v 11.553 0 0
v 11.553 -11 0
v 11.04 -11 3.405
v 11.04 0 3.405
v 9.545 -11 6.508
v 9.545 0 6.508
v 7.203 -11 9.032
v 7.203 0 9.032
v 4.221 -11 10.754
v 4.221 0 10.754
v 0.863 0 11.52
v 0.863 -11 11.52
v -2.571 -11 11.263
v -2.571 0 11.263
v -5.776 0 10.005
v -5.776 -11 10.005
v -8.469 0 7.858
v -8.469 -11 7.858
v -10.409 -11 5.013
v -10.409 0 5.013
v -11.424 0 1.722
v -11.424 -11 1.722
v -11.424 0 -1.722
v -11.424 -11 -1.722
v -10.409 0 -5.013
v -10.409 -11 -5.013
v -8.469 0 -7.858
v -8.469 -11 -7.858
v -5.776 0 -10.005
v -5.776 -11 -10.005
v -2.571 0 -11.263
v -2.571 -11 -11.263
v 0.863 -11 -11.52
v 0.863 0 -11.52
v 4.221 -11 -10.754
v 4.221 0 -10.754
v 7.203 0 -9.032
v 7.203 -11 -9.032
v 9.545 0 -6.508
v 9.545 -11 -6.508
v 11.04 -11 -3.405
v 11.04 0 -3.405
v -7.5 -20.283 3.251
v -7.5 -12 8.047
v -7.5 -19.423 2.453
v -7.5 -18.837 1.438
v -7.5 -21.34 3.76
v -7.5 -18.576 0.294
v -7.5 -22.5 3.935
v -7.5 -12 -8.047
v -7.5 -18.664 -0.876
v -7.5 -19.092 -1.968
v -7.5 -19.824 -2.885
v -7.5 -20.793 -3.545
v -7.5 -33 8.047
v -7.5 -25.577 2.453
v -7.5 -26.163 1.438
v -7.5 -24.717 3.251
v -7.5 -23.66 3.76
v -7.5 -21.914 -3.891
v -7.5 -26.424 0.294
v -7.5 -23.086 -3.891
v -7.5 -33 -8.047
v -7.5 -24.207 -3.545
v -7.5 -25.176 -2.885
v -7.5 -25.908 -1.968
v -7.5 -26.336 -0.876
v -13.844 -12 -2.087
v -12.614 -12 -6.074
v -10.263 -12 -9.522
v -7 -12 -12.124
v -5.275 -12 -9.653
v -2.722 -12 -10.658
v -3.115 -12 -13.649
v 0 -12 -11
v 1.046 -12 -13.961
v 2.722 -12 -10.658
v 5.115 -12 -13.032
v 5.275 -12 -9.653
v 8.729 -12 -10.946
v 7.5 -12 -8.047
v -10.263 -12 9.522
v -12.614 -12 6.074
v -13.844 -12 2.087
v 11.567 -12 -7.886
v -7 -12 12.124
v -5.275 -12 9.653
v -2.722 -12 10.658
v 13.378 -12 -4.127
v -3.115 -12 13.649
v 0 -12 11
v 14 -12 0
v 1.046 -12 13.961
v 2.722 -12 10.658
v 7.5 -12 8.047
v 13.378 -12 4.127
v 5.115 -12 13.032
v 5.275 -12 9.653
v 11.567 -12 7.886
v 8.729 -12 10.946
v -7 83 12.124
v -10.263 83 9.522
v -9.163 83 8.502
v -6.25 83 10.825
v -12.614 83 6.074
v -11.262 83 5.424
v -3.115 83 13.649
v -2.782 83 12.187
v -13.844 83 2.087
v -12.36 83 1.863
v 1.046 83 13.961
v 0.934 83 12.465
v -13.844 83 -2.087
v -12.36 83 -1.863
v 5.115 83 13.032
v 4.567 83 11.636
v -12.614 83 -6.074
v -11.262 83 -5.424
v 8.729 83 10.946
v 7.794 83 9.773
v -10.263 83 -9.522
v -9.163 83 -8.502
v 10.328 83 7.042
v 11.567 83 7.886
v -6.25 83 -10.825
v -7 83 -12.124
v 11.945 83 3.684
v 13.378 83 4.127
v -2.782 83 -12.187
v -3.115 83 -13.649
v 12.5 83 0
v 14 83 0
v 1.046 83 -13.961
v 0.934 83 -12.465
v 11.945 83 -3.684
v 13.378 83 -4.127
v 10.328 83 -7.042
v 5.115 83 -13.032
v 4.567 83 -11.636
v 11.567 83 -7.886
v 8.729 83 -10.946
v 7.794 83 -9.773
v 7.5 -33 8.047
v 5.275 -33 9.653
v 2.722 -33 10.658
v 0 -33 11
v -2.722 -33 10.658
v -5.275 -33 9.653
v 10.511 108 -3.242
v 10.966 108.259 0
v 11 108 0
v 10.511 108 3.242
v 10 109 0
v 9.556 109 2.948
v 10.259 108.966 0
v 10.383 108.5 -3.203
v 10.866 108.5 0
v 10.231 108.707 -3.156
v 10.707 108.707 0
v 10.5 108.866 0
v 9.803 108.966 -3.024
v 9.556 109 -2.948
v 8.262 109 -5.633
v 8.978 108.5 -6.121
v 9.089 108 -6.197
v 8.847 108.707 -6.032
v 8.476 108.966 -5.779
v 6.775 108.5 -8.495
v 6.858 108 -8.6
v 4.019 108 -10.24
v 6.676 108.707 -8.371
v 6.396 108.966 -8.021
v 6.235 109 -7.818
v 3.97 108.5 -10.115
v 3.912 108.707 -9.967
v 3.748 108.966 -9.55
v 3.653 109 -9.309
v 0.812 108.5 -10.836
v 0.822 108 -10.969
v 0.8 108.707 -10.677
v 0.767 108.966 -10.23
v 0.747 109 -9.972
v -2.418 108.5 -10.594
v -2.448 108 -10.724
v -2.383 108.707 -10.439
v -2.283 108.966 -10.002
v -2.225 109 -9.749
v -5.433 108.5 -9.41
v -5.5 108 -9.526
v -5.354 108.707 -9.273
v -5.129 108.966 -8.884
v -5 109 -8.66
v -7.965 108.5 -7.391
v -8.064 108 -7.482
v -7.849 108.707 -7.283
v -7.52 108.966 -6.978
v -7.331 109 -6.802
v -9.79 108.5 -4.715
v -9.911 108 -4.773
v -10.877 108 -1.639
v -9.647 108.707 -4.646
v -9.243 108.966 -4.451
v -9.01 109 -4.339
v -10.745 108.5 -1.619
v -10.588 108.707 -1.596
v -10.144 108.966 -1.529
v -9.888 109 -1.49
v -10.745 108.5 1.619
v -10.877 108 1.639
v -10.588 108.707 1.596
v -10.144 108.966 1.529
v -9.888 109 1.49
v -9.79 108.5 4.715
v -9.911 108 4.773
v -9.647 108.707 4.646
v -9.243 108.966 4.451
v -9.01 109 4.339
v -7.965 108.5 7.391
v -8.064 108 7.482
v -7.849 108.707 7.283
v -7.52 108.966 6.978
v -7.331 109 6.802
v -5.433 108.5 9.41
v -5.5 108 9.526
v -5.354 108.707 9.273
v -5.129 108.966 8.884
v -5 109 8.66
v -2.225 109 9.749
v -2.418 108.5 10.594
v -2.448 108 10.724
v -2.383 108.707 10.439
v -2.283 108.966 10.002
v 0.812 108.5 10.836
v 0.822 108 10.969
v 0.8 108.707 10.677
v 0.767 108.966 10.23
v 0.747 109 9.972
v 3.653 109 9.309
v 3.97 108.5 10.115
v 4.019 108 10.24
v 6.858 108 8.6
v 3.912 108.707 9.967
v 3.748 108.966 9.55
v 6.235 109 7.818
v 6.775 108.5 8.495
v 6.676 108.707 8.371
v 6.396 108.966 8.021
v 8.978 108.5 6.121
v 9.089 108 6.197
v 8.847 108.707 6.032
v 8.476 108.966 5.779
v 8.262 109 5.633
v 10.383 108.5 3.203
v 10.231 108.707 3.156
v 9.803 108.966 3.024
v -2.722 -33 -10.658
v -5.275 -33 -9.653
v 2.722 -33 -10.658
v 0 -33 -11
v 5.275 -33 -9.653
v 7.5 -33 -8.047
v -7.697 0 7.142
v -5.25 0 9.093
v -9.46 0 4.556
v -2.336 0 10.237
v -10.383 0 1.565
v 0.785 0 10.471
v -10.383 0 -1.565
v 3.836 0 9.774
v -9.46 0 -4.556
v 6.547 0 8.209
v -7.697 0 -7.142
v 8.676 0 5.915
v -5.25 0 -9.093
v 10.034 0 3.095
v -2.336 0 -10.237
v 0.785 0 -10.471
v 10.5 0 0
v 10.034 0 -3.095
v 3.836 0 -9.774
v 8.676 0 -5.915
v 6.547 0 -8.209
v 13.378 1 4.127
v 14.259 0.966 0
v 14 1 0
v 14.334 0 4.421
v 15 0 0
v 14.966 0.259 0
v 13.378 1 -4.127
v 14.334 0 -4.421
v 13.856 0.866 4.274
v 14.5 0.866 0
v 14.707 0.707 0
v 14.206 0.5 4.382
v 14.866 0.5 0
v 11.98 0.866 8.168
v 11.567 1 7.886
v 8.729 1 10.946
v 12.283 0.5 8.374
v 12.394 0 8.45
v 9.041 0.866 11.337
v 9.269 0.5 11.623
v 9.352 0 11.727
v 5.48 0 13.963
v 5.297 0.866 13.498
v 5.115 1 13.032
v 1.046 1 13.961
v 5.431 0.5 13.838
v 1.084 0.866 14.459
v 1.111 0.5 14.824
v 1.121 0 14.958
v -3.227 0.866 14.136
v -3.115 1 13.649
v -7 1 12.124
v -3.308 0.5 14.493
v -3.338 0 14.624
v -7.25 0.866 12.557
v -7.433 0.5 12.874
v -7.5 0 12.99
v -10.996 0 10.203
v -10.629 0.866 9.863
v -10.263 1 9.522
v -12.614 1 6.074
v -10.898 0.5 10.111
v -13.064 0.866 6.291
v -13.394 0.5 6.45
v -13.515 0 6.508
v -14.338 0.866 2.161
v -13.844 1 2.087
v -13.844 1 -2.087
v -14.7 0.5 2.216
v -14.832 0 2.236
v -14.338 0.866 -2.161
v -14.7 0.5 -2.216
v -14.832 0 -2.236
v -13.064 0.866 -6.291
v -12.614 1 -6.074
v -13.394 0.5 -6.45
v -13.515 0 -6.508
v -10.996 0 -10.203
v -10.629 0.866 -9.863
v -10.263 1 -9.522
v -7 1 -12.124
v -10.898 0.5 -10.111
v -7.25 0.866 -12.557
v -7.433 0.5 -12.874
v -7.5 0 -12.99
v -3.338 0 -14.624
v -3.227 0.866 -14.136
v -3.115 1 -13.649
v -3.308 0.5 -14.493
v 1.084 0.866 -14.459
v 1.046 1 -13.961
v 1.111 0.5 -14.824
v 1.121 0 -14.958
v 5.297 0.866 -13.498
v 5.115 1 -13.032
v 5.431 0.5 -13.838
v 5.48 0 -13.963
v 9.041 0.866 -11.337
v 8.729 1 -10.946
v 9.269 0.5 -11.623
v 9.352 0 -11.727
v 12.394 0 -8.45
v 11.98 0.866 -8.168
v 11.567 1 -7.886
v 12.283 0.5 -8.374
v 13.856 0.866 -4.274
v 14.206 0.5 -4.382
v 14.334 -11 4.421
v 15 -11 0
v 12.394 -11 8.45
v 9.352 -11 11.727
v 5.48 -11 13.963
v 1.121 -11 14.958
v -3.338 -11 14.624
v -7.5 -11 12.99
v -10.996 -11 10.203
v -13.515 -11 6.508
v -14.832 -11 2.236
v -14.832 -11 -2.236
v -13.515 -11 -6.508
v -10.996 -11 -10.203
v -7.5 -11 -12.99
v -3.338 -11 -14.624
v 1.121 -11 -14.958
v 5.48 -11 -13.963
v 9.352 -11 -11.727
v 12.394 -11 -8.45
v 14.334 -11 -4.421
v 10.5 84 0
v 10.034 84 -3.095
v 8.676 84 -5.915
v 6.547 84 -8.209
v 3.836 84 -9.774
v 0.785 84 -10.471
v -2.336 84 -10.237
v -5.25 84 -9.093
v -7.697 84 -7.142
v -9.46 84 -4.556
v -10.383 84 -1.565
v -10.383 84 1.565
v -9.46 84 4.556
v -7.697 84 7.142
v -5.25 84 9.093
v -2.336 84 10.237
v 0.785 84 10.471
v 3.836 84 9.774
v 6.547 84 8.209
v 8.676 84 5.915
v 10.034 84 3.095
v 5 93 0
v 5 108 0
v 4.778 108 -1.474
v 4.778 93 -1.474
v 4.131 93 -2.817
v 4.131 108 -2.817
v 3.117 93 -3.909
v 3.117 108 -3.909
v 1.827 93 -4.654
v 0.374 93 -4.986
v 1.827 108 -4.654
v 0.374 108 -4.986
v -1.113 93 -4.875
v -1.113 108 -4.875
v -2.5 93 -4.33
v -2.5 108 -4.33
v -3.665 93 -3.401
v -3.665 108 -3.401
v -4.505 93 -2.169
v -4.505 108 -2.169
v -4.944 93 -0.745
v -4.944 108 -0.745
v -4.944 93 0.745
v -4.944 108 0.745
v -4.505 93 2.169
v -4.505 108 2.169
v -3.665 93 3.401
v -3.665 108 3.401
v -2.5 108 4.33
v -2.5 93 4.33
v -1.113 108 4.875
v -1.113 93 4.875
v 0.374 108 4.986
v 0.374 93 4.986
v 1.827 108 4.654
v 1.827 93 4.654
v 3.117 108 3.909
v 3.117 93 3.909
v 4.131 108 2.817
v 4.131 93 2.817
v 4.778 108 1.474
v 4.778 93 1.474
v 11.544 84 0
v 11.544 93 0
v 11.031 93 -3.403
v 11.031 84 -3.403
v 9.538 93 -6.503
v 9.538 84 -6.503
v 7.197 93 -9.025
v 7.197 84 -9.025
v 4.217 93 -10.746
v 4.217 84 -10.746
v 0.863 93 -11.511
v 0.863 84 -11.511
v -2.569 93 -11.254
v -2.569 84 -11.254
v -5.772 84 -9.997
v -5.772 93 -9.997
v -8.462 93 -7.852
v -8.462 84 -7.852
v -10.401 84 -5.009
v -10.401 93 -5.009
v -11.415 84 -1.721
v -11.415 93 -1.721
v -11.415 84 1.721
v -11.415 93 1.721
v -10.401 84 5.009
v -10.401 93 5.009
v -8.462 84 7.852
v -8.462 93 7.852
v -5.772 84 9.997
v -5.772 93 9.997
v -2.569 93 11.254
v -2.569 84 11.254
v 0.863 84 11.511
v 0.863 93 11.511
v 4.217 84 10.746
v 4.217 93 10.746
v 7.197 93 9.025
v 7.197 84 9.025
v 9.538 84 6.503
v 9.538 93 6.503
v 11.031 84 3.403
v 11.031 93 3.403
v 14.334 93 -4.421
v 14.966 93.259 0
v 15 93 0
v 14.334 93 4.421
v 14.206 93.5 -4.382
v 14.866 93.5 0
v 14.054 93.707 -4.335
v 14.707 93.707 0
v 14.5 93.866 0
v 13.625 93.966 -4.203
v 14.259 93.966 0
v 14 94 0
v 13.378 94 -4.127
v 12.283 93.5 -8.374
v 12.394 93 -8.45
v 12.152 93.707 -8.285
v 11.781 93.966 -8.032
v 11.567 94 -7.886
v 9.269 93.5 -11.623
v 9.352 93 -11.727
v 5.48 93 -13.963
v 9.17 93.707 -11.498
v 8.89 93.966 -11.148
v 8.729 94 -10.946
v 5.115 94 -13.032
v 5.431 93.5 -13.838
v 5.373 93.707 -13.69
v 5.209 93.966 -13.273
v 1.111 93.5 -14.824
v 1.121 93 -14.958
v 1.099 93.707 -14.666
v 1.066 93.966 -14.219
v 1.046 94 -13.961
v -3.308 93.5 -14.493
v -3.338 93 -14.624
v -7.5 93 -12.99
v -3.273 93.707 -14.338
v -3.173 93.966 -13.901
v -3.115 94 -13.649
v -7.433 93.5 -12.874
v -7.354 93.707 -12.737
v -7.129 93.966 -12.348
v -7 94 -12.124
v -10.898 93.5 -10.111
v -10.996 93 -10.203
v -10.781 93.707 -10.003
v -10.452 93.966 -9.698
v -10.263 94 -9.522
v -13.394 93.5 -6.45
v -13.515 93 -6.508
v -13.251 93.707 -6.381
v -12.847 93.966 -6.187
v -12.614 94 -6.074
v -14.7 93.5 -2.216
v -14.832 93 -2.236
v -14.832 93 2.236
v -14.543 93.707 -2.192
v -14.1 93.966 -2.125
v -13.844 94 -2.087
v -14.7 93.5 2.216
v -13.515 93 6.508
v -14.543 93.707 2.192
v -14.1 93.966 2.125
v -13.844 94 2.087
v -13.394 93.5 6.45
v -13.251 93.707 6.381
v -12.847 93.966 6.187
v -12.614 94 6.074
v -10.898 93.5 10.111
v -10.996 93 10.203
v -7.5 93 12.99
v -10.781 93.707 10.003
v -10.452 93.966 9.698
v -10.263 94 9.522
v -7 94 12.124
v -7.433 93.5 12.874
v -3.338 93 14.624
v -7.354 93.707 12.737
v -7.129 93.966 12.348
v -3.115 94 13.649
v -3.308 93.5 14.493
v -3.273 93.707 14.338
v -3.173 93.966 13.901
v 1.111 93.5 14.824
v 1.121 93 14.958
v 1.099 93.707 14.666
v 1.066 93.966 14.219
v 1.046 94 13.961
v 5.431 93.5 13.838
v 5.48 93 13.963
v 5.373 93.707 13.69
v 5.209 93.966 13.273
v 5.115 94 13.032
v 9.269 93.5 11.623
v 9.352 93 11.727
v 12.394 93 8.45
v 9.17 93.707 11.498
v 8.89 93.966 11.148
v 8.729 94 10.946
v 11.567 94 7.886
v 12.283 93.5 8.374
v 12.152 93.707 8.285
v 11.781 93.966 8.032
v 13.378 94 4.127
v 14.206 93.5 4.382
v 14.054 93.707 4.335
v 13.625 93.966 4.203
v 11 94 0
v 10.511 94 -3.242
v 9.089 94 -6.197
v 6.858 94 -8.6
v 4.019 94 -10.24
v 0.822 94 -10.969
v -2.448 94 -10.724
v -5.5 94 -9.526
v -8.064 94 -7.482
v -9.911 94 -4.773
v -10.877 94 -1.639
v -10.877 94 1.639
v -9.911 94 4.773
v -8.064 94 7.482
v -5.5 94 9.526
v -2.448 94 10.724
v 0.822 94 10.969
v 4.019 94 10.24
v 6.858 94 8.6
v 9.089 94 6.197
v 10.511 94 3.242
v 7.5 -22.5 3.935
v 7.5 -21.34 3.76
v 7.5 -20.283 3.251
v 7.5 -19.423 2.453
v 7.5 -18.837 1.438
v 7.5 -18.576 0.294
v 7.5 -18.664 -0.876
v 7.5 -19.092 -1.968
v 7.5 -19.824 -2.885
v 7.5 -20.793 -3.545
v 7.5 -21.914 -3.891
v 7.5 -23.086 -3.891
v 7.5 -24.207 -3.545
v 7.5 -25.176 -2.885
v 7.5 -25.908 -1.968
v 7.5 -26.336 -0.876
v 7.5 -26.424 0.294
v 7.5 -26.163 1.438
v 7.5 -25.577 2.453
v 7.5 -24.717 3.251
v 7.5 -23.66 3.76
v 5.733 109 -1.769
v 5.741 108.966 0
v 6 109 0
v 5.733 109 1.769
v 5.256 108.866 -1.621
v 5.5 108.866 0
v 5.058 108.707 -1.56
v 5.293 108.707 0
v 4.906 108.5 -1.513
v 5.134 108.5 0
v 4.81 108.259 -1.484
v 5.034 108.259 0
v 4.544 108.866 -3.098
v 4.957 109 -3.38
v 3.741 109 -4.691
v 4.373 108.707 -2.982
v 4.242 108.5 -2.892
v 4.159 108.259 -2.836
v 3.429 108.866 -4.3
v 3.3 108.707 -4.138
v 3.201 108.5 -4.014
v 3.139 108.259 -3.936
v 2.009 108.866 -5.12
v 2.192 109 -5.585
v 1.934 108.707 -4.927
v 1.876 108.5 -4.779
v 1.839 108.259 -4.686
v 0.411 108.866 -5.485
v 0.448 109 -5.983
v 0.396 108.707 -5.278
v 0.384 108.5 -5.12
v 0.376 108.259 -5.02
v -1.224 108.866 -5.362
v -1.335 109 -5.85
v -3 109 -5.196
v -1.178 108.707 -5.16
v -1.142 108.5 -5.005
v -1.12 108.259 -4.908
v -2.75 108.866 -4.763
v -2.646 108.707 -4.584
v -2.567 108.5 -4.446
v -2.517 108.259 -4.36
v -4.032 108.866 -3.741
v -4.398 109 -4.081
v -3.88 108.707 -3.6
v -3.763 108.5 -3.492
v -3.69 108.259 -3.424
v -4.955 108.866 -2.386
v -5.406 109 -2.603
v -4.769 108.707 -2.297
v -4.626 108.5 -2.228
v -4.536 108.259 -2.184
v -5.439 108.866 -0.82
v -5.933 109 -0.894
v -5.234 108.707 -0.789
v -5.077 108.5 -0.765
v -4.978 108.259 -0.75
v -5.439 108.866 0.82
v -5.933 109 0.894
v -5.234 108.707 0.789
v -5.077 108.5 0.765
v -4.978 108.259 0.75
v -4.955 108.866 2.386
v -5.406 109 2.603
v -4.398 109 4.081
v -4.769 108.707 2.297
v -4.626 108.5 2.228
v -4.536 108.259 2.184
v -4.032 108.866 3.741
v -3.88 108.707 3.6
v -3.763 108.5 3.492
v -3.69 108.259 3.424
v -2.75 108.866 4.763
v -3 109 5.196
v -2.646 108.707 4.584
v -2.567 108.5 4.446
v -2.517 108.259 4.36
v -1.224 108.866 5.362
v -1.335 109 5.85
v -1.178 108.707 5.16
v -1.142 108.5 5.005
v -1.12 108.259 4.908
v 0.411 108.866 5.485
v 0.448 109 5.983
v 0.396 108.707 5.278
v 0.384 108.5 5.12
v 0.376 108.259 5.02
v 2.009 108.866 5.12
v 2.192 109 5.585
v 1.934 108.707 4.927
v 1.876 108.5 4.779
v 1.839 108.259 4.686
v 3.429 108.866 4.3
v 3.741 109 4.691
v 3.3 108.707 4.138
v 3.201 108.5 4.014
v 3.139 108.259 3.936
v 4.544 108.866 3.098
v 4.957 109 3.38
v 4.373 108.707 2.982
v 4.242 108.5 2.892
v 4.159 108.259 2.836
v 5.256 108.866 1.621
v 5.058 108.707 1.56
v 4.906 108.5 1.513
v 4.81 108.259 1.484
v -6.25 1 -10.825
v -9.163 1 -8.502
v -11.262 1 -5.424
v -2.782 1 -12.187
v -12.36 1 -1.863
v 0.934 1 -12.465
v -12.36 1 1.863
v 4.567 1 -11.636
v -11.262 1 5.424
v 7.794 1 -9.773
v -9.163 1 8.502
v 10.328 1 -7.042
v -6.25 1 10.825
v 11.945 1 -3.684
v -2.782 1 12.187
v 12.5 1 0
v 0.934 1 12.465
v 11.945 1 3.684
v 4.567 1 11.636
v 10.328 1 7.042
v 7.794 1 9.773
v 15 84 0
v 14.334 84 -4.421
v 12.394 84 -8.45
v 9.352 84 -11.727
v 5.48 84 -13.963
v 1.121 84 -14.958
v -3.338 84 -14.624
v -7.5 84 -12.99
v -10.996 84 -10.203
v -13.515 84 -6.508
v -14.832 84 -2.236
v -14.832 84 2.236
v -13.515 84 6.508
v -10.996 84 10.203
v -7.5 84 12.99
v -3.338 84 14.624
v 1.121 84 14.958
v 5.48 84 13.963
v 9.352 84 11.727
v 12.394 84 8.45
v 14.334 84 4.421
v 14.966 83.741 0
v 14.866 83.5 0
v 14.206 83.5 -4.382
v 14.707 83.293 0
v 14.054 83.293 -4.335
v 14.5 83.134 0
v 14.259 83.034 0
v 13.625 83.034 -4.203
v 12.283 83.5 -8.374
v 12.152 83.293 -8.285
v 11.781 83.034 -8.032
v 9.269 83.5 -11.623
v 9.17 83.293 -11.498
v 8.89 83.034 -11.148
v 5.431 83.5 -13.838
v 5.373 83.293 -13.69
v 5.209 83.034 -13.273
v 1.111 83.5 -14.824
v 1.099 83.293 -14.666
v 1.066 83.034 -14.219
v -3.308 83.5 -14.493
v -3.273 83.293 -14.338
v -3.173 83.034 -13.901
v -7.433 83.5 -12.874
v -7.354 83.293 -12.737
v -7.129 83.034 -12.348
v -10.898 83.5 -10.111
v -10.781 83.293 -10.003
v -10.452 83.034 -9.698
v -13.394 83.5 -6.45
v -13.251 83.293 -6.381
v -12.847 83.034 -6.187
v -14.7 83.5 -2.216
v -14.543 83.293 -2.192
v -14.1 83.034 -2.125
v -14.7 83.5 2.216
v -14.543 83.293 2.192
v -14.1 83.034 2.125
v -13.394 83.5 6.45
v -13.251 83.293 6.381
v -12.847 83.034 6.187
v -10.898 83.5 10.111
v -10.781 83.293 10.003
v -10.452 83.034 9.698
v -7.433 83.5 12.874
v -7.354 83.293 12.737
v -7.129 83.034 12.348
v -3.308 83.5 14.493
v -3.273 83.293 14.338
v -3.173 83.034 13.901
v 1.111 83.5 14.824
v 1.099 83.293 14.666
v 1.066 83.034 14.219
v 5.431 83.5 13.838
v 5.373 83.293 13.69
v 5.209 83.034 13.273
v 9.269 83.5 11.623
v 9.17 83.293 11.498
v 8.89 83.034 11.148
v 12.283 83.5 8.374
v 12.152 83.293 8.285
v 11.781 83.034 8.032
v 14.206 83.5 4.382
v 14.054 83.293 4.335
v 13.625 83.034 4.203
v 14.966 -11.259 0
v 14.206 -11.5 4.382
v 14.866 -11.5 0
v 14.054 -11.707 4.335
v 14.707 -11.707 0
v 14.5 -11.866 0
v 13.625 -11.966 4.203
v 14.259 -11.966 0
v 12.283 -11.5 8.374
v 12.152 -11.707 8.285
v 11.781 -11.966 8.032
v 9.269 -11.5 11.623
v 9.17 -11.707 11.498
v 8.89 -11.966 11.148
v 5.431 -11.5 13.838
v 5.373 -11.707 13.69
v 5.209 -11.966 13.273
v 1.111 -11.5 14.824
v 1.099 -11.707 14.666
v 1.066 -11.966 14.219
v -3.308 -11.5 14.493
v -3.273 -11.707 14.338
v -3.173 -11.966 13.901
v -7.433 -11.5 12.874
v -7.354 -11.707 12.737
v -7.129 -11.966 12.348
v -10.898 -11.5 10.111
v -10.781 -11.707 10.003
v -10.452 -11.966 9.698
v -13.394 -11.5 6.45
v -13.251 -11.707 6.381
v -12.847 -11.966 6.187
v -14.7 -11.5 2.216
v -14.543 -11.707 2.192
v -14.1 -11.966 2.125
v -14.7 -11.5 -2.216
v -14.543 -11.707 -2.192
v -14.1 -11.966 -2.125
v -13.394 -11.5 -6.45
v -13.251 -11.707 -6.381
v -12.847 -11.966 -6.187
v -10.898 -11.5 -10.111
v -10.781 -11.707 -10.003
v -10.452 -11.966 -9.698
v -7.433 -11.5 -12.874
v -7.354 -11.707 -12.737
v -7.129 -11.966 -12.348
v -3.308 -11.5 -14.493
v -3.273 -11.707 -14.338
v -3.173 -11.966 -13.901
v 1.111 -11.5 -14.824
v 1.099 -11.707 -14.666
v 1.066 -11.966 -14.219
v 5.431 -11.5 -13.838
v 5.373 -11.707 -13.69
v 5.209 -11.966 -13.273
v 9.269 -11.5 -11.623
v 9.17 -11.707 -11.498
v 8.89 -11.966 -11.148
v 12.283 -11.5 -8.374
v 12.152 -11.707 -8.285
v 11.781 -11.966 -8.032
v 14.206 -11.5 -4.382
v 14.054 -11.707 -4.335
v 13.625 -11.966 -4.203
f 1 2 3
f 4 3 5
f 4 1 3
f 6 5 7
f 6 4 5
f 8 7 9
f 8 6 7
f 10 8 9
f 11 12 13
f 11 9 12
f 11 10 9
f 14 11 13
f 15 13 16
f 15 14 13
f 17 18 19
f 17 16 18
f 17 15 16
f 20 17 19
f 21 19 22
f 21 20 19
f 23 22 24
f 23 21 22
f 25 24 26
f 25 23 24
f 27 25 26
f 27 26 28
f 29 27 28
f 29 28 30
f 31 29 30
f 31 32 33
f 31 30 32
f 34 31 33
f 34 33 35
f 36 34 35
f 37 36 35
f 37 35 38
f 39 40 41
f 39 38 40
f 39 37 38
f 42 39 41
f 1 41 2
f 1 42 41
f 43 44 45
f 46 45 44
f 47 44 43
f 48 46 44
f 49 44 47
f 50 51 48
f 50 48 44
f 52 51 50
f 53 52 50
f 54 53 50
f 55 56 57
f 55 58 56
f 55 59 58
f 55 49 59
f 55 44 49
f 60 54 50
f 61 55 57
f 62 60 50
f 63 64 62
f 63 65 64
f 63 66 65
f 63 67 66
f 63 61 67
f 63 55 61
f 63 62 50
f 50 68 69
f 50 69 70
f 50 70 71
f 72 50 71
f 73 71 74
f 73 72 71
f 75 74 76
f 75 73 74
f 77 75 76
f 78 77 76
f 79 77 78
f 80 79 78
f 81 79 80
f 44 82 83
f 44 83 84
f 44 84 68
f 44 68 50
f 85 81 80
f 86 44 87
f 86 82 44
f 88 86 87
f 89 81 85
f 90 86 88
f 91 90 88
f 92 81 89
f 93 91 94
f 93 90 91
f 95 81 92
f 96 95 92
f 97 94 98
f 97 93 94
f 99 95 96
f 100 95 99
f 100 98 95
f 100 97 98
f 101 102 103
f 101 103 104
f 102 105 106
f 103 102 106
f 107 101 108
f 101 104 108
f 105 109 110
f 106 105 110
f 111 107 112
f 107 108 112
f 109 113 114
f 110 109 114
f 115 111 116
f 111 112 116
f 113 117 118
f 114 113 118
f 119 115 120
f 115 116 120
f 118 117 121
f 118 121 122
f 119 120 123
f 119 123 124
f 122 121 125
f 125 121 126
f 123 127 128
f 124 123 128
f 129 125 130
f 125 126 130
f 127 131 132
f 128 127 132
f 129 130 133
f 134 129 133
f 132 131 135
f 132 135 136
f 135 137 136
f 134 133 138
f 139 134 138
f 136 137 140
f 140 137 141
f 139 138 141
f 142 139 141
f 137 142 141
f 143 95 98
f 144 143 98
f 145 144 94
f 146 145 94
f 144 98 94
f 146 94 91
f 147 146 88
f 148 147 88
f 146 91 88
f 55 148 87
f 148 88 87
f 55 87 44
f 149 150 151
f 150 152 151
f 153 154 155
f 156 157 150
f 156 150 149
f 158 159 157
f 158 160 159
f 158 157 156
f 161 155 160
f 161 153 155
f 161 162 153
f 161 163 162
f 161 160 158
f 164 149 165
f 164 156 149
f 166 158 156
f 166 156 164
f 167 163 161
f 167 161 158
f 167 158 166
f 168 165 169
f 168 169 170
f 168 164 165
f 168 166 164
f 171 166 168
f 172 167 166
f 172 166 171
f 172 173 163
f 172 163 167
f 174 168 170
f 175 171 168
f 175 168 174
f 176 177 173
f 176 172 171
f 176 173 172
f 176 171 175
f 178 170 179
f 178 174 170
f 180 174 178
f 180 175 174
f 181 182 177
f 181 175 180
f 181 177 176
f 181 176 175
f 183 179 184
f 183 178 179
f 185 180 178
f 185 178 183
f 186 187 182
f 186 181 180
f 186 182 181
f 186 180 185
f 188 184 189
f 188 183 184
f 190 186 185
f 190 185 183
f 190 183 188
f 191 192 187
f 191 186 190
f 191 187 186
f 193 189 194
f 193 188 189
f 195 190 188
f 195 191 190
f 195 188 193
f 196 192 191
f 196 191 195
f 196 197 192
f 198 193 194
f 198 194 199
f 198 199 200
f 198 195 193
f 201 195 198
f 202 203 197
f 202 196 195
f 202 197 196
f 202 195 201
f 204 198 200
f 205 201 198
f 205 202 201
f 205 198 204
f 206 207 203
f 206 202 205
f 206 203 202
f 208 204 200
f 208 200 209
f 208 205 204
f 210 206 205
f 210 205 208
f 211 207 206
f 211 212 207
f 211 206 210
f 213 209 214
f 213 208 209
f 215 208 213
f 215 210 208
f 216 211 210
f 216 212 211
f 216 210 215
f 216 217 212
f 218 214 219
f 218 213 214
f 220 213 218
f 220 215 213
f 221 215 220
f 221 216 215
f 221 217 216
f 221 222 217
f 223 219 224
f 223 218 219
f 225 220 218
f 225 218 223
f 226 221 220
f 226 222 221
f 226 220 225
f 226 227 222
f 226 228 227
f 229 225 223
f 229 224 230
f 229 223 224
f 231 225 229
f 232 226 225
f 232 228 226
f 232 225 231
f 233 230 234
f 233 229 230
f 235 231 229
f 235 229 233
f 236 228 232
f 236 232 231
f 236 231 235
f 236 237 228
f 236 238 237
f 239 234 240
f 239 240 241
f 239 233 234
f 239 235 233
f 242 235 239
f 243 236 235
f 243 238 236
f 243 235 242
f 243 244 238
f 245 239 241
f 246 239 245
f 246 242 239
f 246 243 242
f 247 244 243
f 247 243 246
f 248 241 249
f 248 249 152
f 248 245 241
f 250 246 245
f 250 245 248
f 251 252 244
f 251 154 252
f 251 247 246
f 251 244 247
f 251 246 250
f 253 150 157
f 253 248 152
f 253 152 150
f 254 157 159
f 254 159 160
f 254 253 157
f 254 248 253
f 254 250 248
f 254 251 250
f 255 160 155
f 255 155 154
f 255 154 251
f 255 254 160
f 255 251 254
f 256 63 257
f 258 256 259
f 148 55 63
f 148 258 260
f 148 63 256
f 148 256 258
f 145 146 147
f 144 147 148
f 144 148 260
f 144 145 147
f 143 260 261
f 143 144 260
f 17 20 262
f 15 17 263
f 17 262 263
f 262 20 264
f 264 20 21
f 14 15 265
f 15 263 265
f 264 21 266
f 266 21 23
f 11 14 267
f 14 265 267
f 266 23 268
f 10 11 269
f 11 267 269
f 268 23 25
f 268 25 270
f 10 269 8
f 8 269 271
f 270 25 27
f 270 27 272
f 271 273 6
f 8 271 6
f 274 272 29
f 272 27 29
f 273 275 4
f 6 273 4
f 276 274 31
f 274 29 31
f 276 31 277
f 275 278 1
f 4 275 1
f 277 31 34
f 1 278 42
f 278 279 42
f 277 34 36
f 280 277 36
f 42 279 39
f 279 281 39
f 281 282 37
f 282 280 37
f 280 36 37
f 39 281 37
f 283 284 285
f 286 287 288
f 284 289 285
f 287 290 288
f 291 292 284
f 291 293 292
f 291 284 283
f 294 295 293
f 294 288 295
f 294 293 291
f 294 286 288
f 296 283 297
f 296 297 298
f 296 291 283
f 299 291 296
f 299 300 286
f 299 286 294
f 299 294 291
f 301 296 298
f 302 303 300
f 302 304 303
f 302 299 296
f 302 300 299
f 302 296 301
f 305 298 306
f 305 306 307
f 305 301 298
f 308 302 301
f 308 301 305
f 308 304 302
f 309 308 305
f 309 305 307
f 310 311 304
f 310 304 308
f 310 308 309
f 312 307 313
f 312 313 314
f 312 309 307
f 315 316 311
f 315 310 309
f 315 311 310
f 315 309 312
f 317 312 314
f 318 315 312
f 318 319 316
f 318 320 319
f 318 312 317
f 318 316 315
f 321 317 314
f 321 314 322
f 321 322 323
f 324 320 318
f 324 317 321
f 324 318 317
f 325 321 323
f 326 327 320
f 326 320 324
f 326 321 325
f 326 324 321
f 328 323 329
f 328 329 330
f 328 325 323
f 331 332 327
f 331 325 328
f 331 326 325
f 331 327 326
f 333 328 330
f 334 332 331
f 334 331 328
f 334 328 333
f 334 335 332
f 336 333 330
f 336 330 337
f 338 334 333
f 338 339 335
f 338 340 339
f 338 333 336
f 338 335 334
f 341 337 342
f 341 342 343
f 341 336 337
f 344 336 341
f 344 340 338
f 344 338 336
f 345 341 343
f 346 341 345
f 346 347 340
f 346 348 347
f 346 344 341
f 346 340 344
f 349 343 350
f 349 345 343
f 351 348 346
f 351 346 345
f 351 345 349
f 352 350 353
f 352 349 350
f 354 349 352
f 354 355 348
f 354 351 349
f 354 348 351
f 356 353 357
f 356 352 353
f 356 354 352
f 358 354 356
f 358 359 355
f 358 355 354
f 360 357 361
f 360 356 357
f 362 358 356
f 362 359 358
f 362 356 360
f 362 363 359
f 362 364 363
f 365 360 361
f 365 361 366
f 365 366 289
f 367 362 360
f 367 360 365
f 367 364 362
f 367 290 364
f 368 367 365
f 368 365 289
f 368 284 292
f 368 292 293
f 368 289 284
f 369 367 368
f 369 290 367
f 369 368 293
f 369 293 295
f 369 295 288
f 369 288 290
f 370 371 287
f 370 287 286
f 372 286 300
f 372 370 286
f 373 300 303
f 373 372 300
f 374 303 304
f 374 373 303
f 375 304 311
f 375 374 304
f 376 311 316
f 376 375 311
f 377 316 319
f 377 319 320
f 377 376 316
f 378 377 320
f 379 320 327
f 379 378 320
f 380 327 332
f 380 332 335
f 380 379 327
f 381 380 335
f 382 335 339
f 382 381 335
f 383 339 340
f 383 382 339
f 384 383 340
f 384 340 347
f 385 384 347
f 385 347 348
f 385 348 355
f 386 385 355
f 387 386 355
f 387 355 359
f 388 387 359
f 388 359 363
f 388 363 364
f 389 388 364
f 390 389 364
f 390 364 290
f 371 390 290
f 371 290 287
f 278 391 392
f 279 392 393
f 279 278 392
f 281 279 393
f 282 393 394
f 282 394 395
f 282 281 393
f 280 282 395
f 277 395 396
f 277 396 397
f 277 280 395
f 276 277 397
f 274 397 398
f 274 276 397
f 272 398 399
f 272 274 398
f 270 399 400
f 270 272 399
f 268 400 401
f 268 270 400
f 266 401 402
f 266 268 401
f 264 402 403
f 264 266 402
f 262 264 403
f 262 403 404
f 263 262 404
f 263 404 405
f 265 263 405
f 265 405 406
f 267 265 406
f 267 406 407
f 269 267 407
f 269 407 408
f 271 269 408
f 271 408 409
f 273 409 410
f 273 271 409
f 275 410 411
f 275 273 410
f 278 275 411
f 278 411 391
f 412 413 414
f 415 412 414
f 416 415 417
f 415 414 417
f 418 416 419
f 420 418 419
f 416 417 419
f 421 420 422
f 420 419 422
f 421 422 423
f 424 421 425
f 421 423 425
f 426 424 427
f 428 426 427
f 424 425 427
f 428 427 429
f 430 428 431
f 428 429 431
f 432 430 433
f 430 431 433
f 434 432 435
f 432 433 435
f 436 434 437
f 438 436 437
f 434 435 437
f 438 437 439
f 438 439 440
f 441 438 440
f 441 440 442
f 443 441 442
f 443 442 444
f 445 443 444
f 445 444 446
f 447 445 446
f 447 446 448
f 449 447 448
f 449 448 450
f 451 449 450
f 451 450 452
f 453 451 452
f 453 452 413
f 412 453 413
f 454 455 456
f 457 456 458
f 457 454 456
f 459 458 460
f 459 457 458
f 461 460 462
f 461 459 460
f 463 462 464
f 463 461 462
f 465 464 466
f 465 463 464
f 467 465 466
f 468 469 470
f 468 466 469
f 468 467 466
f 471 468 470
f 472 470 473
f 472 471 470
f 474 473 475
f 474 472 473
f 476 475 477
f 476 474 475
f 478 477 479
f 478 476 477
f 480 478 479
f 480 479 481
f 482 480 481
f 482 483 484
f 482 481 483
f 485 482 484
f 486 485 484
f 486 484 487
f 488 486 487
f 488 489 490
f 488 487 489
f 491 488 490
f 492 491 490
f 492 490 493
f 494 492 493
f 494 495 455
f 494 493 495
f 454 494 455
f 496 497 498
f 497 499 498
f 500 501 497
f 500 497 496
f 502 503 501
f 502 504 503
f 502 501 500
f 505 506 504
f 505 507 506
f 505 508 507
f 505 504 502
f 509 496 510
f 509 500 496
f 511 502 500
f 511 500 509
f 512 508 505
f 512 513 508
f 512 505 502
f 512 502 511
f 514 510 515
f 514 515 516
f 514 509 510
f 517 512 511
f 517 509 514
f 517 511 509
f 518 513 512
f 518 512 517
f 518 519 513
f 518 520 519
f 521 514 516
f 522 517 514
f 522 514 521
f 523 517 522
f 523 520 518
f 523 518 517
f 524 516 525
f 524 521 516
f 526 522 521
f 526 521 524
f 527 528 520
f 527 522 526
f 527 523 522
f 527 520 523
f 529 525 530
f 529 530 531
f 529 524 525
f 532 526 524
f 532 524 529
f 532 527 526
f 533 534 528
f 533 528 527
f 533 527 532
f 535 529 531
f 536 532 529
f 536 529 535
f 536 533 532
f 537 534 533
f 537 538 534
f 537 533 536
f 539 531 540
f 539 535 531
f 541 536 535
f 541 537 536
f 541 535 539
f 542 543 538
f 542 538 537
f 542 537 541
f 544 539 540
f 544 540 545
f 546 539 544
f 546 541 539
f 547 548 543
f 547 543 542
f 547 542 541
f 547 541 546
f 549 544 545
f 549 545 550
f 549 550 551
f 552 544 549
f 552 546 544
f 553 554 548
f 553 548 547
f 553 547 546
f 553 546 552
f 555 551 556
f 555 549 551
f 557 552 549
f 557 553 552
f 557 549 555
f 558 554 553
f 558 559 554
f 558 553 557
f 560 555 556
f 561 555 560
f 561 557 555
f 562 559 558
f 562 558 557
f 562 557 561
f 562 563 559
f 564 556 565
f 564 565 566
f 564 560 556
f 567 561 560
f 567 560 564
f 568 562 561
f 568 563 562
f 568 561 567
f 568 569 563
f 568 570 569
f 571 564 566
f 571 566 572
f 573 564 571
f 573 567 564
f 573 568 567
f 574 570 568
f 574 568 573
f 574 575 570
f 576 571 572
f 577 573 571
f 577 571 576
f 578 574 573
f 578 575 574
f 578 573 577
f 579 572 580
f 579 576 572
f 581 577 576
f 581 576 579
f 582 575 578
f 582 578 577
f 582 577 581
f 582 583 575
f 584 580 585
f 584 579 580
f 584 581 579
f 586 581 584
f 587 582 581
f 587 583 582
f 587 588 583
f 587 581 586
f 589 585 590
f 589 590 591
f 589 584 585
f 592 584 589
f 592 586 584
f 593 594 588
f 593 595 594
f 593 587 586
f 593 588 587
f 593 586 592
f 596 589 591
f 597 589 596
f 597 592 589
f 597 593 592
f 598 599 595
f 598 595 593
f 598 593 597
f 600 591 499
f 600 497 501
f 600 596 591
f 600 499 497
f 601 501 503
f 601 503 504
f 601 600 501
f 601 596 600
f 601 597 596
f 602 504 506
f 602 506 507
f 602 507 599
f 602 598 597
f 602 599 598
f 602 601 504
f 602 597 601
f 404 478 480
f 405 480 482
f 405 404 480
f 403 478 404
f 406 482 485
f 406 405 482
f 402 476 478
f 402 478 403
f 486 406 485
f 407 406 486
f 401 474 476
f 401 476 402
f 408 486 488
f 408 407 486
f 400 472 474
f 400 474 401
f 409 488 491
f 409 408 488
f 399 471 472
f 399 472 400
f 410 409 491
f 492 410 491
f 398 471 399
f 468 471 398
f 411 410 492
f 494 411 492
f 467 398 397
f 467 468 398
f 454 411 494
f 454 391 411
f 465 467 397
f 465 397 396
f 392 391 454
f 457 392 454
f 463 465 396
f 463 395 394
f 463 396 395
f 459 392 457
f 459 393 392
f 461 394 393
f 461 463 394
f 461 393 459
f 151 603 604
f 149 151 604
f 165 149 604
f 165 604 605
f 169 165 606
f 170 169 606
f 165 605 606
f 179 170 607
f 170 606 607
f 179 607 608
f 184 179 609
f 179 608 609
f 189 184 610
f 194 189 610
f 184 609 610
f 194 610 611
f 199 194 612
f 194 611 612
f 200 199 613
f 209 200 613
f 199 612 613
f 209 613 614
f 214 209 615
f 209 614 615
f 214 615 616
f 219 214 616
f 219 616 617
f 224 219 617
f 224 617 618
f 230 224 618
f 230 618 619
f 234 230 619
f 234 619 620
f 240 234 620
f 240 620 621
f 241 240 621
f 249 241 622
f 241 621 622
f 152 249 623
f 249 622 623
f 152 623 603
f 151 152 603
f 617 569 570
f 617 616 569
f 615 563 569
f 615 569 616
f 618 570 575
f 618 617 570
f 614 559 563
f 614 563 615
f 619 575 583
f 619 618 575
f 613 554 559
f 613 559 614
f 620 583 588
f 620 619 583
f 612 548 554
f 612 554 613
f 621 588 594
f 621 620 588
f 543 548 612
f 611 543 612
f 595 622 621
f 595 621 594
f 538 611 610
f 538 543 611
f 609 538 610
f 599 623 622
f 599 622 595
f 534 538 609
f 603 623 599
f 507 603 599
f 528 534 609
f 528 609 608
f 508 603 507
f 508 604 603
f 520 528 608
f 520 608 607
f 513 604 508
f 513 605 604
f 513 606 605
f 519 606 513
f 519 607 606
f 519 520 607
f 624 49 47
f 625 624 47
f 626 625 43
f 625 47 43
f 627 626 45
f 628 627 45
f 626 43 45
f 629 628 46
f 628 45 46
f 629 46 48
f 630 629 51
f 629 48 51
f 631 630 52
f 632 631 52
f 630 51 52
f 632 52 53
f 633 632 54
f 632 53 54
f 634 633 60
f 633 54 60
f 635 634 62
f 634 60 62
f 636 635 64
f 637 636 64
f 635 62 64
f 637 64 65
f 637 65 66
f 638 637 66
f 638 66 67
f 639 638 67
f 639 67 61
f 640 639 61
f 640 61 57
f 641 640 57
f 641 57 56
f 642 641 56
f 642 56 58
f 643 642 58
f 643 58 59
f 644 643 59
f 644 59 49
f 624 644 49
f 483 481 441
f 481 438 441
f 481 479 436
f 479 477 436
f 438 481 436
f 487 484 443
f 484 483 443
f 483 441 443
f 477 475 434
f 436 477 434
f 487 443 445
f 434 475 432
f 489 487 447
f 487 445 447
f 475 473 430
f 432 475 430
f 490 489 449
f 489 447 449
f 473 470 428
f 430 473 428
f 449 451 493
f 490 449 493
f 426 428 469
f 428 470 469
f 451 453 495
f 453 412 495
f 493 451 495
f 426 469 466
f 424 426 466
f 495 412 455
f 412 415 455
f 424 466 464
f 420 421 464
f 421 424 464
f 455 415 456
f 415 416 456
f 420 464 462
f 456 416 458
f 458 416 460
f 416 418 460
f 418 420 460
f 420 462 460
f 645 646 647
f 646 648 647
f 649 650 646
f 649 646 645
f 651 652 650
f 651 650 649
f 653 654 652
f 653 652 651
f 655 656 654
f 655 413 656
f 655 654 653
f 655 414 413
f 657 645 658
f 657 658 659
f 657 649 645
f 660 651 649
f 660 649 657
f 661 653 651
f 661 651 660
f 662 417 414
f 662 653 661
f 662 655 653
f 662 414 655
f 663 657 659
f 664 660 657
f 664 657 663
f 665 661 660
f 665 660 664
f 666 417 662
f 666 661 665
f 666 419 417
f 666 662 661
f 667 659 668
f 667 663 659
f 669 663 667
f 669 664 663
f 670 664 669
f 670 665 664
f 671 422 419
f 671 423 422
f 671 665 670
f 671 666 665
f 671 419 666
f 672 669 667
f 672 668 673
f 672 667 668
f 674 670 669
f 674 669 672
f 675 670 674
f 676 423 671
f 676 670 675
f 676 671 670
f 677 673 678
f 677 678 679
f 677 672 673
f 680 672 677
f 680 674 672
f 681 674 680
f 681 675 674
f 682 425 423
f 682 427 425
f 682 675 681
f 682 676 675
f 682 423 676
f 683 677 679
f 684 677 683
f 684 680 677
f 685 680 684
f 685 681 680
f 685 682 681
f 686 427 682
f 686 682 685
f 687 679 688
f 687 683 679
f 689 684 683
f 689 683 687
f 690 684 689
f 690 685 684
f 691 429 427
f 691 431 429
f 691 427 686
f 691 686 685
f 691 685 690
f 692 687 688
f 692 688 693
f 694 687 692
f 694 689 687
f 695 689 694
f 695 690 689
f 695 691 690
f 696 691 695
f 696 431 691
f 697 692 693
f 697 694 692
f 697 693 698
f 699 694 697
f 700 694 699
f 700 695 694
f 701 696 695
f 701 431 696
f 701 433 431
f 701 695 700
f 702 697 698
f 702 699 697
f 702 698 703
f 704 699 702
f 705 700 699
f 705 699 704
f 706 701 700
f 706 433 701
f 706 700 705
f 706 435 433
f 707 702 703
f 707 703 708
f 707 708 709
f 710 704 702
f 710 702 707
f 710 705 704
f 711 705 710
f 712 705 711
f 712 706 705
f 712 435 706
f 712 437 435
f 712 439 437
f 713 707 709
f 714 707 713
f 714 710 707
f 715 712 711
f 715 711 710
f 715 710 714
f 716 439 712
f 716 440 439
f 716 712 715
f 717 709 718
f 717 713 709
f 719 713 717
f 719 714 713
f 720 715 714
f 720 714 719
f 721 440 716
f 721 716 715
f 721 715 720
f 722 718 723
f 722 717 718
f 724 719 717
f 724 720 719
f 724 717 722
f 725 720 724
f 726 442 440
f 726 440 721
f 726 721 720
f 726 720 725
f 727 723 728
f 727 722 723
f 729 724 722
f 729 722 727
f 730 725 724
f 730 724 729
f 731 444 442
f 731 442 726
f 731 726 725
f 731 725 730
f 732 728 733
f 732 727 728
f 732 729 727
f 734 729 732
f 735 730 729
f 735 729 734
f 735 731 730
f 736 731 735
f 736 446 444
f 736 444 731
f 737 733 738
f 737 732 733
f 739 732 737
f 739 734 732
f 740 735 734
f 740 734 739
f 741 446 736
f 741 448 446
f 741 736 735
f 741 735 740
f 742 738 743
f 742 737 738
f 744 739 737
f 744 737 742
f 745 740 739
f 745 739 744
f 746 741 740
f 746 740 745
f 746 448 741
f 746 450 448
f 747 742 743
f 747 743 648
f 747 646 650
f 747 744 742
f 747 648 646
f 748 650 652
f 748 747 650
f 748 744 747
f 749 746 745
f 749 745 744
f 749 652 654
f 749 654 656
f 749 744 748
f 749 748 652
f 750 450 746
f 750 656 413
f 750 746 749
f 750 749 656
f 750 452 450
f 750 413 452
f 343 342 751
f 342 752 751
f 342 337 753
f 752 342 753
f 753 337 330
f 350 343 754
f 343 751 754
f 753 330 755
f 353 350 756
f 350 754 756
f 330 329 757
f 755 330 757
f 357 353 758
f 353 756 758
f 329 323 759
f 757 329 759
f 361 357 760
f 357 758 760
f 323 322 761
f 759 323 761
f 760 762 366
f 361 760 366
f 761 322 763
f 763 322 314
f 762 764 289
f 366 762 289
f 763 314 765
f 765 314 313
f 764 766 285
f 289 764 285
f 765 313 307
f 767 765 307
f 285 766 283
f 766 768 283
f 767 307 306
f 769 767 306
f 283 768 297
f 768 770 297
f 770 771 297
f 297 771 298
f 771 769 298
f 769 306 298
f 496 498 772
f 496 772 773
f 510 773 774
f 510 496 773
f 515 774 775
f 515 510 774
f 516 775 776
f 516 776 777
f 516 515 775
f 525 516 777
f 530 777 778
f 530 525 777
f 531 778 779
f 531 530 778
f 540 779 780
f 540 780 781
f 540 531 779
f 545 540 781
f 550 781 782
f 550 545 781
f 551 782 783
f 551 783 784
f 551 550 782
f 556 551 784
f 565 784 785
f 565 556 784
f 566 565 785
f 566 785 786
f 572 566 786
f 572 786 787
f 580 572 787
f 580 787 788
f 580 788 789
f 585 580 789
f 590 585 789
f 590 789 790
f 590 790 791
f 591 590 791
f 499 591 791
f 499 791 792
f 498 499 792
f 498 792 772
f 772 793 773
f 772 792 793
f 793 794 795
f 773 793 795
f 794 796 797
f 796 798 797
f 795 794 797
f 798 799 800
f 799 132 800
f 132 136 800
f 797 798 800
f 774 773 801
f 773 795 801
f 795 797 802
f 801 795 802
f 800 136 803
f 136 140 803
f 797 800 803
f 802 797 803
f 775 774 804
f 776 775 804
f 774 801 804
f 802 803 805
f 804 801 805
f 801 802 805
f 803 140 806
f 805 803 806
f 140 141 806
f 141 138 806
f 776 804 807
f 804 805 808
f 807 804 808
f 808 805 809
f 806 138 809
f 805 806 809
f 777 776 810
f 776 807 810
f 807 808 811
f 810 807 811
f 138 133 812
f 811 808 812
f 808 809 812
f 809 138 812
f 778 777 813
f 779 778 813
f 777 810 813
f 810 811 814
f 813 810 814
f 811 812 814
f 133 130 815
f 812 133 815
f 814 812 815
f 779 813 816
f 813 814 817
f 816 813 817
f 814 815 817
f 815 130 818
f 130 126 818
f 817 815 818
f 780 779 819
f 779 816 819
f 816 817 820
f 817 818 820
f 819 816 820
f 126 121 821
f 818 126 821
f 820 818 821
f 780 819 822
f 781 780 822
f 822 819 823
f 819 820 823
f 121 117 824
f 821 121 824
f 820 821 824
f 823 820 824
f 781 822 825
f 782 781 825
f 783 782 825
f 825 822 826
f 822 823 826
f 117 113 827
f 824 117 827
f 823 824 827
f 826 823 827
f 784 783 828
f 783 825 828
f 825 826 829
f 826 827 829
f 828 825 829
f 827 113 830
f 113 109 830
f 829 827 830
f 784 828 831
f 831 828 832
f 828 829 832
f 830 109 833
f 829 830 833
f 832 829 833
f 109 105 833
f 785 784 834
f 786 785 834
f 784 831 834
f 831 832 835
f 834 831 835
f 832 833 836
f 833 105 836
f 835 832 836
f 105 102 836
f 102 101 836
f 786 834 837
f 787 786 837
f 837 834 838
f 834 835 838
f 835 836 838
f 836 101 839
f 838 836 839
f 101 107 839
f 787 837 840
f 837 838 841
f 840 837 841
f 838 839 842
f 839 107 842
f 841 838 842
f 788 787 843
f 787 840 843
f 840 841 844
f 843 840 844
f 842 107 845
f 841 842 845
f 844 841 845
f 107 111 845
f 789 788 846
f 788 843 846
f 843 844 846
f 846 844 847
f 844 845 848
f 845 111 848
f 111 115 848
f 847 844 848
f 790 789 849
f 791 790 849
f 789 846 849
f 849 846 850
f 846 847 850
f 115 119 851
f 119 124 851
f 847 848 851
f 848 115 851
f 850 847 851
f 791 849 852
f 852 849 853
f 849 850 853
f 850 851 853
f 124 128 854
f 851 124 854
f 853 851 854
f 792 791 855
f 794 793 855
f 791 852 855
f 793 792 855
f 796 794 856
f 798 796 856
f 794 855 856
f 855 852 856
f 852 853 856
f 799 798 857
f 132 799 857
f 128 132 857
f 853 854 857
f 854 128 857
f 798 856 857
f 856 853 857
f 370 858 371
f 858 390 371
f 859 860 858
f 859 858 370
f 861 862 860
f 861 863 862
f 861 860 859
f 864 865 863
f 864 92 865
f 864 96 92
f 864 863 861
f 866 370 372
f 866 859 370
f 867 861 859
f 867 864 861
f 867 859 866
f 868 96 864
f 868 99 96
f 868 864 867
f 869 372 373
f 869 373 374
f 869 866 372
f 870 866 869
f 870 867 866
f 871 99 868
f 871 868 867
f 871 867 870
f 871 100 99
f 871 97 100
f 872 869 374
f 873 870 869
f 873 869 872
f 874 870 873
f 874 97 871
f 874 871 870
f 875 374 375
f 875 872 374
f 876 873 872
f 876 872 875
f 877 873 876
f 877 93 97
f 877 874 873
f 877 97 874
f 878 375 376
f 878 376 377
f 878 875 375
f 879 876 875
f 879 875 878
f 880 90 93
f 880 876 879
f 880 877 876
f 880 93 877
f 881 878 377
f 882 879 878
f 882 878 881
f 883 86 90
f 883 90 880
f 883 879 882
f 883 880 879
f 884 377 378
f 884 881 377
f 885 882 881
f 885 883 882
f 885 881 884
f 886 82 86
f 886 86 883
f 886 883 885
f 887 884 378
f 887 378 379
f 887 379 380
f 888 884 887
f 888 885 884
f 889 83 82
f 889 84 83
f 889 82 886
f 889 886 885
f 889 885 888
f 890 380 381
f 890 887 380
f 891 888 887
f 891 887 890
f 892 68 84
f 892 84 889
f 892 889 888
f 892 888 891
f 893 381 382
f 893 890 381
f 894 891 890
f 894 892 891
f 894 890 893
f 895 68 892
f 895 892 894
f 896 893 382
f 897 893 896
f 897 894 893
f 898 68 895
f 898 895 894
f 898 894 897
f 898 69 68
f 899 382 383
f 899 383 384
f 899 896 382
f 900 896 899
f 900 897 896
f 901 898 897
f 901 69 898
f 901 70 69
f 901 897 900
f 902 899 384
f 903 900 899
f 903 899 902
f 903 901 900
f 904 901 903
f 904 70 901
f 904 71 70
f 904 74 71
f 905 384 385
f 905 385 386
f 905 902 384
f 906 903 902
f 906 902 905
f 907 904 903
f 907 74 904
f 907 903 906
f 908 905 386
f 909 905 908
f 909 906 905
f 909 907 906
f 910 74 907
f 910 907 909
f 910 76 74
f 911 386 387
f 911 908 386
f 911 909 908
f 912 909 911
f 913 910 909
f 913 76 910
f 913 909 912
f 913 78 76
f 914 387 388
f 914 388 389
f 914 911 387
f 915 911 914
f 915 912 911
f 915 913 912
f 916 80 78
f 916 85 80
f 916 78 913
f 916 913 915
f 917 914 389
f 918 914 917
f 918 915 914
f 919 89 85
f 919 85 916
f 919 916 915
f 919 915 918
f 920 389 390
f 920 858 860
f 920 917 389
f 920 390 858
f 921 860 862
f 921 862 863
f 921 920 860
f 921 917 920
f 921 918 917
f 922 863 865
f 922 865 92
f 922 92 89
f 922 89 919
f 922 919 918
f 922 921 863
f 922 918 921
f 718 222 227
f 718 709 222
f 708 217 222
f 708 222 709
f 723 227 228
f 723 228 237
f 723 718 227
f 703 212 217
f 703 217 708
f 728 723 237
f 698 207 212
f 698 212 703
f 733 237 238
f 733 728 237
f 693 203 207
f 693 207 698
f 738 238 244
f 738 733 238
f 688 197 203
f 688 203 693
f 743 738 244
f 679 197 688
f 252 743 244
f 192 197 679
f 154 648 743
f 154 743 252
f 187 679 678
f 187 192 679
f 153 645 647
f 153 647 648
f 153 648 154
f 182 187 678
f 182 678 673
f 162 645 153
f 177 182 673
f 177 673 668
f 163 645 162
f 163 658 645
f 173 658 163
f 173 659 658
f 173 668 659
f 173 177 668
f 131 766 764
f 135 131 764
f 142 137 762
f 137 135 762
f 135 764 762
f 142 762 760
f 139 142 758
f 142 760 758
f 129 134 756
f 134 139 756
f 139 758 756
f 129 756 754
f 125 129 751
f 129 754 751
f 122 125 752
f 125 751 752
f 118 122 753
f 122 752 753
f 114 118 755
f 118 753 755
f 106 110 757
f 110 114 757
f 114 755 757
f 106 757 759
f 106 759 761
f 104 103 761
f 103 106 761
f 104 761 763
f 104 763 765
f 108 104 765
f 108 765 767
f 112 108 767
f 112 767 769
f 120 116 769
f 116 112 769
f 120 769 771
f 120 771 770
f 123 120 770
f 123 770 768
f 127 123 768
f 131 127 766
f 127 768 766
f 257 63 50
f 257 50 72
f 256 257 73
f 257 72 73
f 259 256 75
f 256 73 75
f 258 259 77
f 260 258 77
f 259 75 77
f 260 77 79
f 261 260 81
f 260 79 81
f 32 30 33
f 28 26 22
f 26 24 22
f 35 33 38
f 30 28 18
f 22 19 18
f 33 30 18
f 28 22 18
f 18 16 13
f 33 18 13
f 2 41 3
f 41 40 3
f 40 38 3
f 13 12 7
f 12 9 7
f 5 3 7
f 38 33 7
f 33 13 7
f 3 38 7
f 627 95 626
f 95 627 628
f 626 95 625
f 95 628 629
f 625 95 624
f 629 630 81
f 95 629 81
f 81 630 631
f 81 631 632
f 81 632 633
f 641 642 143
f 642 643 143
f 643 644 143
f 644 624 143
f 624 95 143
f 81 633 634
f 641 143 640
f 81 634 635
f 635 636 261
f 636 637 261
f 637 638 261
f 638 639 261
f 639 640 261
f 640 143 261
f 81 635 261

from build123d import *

# Parameters (mm, degrees)
SKETCH5_R                = 12.5
SKETCH5_R_2              = 10.5
BOSS_EXTRUDE2_DEPTH      = 84
SKETCH6_R                = 15
SKETCH6_R_2              = 11.543764588
BOSS_EXTRUDE3_DEPTH      = 10
BOSS_EXTRUDE3_DEPTH_BACK = 1
SKETCH7_R                = 15
SKETCH7_R_2              = 11.552767092
BOSS_EXTRUDE4_DEPTH      = 12
BOSS_EXTRUDE4_DEPTH_BACK = 1
FILLET1_R                = 1
FILLET2_R                = 1
FILLET3_R                = 1
FILLET4_R                = 1
SKETCH8_R                = 12.593226889
BOSS_EXTRUDE5_DEPTH      = 1
SKETCH9_R                = 12.737258032
BOSS_EXTRUDE6_DEPTH      = 1
SKETCH10_R               = 11
BOSS_EXTRUDE7_DEPTH      = 21
CUT_EXTRUDE1_DEPTH       = 21
SKETCH12_R               = 3.935
CUT_EXTRUDE2_DEPTH       = 23.5000001
SKETCH13_R               = 11
BOSS_EXTRUDE8_DEPTH      = 15
SKETCH14_R               = 5
CUT_EXTRUDE3_DEPTH       = 20
FILLET5_R                = 1
FILLET6_R                = 1


with BuildPart() as part:
    # Sketch5 → Boss-Extrude2 (new body)
    with BuildSketch(Plane(origin=(0, 0, 0), x_dir=(1, 0, 0), z_dir=(0, 1, 0))):
        Circle(SKETCH5_R)
        Circle(SKETCH5_R_2, mode=Mode.SUBTRACT)
    extrude(amount=BOSS_EXTRUDE2_DEPTH)

    # Sketch6 → Boss-Extrude3 (add, two sides)
    with BuildSketch(Plane(origin=(0, 84, 0), x_dir=(1, 0, 0), z_dir=(0, 1, 0))) as boss_extrude3_sk:
        Circle(SKETCH6_R)
        Circle(SKETCH6_R_2, mode=Mode.SUBTRACT)
    extrude(amount=BOSS_EXTRUDE3_DEPTH)
    extrude(boss_extrude3_sk.sketch, amount=-BOSS_EXTRUDE3_DEPTH_BACK)

    # Sketch7 → Boss-Extrude4 (add, two sides)
    with BuildSketch(Plane.XZ) as boss_extrude4_sk:
        Circle(SKETCH7_R)
        Circle(SKETCH7_R_2, mode=Mode.SUBTRACT)
    extrude(amount=BOSS_EXTRUDE4_DEPTH)
    extrude(boss_extrude4_sk.sketch, amount=-BOSS_EXTRUDE4_DEPTH_BACK)

    # Fillet1
    fillet1_edges = [part.edges().sort_by_distance(p)[0] for p in [
        (-15, 83, 0),
    ]]
    fillet(fillet1_edges, radius=FILLET1_R)

    # Fillet2
    fillet2_edges = [part.edges().sort_by_distance(p)[0] for p in [
        (-15, 1, 0),
    ]]
    fillet(fillet2_edges, radius=FILLET2_R)

    # Fillet3
    fillet3_edges = [part.edges().sort_by_distance(p)[0] for p in [
        (-15, 94, 0),
    ]]
    fillet(fillet3_edges, radius=FILLET3_R)

    # Fillet4
    fillet4_edges = [part.edges().sort_by_distance(p)[0] for p in [
        (-15, -12, 0),
    ]]
    fillet(fillet4_edges, radius=FILLET4_R)

    # Sketch8 → Boss-Extrude5 (add)
    with BuildSketch(Plane(origin=(0, 94, 0), x_dir=(1, 0, 0), z_dir=(0, 1, 0))):
        Circle(SKETCH8_R)
    extrude(amount=-BOSS_EXTRUDE5_DEPTH)

    # Sketch9 → Boss-Extrude6 (add)
    with BuildSketch(Plane.XZ.offset(12)):
        Circle(SKETCH9_R)
    extrude(amount=-BOSS_EXTRUDE6_DEPTH)

    # Sketch10 → Boss-Extrude7 (add)
    with BuildSketch(Plane.XZ.offset(12)):
        Circle(SKETCH10_R)
    extrude(amount=BOSS_EXTRUDE7_DEPTH)

    # Sketch11 → Cut-Extrude1 (cut)
    with BuildSketch(Plane.XZ.offset(33)):
        with BuildLine():
            Line((-7.5, 8.04673847), (-7.5, 0))
            Line((-7.5, 0), (-7.5, -8.04673847))
            ThreePointArc((-7.5, -8.04673847), (-11, 0), (-7.5, 8.04673847))
        make_face()
        with BuildLine():
            Line((7.5, 0), (7.5, -8.04673847))
            ThreePointArc((7.5, -8.04673847), (11, 0), (7.5, 8.04673847))
            Line((7.5, 8.04673847), (7.5, 0))
        make_face()
    extrude(amount=-CUT_EXTRUDE1_DEPTH, mode=Mode.SUBTRACT)

    # Sketch12 → Cut-Extrude2 (cut, through all)
    with BuildSketch(Plane.ZY.offset(7.5)):
        with Locations((0, -22.5)):
            Circle(SKETCH12_R)
    extrude(amount=-CUT_EXTRUDE2_DEPTH, mode=Mode.SUBTRACT)

    # Sketch13 → Boss-Extrude8 (add)
    with BuildSketch(Plane(origin=(0, 94, 0), x_dir=(1, 0, 0), z_dir=(0, 1, 0))):
        Circle(SKETCH13_R)
    extrude(amount=BOSS_EXTRUDE8_DEPTH)

    # Sketch14 → Cut-Extrude3 (cut)
    with BuildSketch(Plane(origin=(0, 109, 0), x_dir=(1, 0, 0), z_dir=(0, 1, 0))):
        Circle(SKETCH14_R)
    extrude(amount=-CUT_EXTRUDE3_DEPTH, mode=Mode.SUBTRACT)

    # Fillet5
    fillet5_edges = [part.edges().sort_by_distance(p)[0] for p in [
        (-11, 109, 0),
    ]]
    fillet(fillet5_edges, radius=FILLET5_R)

    # Fillet6
    fillet6_edges = [part.edges().sort_by_distance(p)[0] for p in [
        (-5, 109, 0),
    ]]
    fillet(fillet6_edges, radius=FILLET6_R)


solid = part.part
